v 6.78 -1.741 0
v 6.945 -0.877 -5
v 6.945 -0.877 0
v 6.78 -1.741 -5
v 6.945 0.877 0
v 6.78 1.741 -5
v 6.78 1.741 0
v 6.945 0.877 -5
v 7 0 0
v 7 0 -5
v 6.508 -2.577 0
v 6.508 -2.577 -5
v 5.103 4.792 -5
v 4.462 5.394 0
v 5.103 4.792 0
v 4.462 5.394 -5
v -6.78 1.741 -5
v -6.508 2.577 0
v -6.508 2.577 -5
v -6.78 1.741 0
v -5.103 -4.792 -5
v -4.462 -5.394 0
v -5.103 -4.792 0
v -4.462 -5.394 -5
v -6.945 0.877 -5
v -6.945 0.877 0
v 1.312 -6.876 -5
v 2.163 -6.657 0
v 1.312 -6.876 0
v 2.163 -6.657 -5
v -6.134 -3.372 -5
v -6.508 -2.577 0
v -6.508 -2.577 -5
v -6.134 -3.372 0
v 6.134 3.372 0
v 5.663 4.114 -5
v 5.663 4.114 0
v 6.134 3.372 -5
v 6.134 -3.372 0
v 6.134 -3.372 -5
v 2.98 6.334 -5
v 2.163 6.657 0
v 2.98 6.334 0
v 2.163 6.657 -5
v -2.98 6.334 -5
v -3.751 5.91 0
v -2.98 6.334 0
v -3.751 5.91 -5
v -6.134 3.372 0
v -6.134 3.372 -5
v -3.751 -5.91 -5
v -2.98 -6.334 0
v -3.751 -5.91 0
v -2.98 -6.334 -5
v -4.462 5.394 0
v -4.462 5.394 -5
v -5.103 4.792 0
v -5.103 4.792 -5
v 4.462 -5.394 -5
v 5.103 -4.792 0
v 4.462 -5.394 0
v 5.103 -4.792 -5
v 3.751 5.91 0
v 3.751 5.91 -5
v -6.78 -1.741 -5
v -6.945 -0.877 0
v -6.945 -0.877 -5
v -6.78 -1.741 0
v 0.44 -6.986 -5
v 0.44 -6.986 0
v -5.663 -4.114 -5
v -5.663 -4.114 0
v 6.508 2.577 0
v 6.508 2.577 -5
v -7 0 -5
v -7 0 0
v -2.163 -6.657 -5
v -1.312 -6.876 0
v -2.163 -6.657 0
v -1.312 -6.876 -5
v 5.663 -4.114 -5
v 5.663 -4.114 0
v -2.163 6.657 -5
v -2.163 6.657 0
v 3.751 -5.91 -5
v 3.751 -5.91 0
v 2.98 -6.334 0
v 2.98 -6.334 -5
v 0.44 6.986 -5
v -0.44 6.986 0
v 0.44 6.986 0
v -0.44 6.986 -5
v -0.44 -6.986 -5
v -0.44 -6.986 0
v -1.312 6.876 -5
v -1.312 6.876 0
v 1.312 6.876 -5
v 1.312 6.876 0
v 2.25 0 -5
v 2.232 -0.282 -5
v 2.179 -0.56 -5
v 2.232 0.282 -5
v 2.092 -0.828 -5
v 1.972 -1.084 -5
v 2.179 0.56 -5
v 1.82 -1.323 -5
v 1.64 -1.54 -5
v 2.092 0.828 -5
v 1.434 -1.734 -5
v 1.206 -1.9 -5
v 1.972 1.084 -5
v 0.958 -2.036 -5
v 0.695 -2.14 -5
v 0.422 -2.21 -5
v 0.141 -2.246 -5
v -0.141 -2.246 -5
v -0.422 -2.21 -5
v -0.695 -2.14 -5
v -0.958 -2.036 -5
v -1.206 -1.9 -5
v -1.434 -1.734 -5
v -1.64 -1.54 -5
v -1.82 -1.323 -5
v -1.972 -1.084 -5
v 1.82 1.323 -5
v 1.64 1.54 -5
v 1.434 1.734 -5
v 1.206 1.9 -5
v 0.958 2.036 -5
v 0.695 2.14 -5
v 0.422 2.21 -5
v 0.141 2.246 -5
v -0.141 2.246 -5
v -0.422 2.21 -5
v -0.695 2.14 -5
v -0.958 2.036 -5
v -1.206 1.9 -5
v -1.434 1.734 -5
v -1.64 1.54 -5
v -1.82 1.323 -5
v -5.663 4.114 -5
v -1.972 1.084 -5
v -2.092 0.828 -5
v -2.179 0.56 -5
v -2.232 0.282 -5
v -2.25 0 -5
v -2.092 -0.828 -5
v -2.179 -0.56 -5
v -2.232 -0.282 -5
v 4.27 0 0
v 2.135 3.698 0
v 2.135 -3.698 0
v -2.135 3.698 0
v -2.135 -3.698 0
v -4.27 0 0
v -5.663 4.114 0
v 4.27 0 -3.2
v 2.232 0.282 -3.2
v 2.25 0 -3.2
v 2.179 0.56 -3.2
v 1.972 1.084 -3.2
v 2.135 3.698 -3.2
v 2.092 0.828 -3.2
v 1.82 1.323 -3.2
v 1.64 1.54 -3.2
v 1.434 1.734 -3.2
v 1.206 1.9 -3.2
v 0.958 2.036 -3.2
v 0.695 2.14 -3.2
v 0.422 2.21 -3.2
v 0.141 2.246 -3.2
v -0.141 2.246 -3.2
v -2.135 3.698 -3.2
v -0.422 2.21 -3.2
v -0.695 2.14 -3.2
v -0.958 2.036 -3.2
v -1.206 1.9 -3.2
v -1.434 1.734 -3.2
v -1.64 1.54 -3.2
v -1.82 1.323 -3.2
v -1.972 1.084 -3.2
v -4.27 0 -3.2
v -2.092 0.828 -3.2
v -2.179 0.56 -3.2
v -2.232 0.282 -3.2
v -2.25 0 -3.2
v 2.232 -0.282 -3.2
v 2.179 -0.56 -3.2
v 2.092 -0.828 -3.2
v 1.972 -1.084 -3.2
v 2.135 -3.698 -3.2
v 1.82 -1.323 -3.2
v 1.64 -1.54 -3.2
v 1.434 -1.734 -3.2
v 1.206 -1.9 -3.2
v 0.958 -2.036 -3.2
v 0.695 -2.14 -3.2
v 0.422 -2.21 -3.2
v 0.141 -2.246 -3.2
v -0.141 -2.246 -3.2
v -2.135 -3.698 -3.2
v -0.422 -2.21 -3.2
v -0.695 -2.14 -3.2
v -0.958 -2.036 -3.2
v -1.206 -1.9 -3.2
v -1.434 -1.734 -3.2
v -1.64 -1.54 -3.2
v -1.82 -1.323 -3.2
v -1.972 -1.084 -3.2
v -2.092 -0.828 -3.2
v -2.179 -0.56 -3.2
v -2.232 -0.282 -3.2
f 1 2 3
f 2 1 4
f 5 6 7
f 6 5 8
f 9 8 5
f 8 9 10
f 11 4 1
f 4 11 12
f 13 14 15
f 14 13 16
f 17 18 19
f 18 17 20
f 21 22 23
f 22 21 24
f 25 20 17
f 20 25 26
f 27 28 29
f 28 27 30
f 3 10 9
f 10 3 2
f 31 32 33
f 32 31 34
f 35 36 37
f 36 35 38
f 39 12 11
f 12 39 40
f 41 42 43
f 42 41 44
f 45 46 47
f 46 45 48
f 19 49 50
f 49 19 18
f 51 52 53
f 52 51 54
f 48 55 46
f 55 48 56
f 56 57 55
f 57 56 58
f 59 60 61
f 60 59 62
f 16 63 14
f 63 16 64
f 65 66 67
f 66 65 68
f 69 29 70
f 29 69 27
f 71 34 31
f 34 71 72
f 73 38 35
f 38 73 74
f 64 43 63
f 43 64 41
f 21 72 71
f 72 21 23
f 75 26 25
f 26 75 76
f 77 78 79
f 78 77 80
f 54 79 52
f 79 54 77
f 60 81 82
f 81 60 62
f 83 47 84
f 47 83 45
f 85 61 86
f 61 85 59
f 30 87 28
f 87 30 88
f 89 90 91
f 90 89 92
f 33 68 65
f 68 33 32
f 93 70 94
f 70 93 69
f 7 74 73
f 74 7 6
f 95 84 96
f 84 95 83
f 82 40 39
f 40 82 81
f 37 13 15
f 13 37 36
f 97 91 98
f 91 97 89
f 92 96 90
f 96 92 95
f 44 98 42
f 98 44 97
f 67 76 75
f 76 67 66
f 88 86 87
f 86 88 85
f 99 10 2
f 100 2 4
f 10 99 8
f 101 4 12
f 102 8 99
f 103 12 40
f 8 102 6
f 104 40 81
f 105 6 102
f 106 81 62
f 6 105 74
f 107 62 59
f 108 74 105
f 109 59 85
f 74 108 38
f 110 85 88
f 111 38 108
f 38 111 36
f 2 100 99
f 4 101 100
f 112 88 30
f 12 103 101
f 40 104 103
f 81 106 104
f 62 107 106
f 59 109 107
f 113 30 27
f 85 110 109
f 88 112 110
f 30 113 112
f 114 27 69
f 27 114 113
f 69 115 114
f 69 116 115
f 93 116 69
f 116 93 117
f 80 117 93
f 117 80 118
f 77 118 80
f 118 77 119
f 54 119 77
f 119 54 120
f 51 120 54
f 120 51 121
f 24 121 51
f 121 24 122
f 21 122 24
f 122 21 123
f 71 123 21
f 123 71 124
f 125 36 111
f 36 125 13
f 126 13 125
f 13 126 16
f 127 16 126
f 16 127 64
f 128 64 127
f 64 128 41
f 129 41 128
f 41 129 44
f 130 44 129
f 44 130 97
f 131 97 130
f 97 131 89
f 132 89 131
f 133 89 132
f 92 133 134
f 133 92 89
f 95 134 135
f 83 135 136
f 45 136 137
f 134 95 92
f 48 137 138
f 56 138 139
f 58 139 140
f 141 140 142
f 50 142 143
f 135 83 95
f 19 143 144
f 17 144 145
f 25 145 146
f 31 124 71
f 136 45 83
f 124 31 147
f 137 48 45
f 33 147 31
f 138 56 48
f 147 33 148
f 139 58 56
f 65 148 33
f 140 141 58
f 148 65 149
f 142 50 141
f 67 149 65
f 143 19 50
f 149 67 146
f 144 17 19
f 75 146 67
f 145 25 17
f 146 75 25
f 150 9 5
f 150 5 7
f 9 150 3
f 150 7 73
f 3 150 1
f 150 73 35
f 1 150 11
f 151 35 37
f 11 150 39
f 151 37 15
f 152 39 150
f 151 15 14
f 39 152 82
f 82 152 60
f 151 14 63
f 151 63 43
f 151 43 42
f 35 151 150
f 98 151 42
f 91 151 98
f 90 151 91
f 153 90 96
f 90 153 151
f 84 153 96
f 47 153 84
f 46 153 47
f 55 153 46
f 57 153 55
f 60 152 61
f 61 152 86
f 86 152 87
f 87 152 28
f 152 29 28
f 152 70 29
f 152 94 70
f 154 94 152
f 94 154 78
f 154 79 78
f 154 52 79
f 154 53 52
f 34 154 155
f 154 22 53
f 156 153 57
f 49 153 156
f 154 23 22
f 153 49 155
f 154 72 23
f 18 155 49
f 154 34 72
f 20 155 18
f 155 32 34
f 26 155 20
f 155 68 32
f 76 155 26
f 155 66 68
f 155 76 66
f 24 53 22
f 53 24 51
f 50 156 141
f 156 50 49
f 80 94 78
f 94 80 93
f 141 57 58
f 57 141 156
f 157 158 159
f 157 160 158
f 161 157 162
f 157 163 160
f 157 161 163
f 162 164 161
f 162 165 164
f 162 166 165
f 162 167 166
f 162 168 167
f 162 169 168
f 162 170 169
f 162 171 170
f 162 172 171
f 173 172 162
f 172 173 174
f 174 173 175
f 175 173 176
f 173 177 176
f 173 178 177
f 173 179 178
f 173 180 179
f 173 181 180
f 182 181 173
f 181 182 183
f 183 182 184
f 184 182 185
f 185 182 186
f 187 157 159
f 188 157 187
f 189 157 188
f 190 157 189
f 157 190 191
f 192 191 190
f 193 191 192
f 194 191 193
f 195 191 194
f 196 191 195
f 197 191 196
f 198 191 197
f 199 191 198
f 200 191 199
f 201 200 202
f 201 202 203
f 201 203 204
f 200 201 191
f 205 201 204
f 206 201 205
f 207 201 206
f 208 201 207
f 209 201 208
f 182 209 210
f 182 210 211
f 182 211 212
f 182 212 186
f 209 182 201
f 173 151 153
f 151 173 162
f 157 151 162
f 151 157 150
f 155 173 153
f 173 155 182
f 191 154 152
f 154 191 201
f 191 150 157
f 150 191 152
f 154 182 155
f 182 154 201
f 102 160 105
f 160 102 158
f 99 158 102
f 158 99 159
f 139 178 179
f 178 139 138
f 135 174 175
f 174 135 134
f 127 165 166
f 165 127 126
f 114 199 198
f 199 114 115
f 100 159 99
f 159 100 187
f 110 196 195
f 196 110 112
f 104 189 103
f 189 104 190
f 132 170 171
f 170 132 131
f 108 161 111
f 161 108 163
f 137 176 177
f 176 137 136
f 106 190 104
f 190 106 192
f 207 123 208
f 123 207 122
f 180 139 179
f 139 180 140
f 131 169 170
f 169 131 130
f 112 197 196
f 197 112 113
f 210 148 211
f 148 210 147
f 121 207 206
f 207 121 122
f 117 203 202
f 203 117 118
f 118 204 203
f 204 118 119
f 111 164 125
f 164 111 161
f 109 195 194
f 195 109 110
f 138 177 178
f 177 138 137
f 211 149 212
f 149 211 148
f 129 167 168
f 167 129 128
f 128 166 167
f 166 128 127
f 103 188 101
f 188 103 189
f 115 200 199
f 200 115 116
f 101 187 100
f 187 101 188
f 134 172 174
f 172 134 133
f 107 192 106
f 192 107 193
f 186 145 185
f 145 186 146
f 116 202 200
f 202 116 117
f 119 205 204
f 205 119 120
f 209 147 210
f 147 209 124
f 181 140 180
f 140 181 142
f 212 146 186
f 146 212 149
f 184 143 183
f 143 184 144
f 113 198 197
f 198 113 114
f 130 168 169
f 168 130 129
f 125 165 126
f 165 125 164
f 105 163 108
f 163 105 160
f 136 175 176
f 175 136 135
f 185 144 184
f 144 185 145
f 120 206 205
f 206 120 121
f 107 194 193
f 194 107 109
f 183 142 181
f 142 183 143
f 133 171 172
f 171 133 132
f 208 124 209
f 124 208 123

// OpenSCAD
$fn = 50;


difference() {
	union() {
		translate(v = [0, 0, -5.0000000000]) {
			cylinder(h = 5.0000000000, r = 7.0000000000);
		}
		translate(v = [0, 0, -3.5000000000]) {
			cylinder(h = 3.5000000000, r = 2.8750000000);
		}
	}
	union() {
		translate(v = [0, 0, 0]) {
			rotate(a = [0, 0, 0]) {
				difference() {
					union() {
						translate(v = [0, 0, -3.2000000000]) {
							linear_extrude(height = 3.2000000000) {
								polygon(points = [[4.2698000000, 0.0000000000], [2.1349000000, 3.6977552691], [-2.1349000000, 3.6977552691], [-4.2698000000, 0.0000000000], [-2.1349000000, -3.6977552691], [2.1349000000, -3.6977552691]]);
							}
						}
					}
					union();
				}
			}
		}
		#translate(v = [0, 0, -100.0000000000]) {
			cylinder(h = 200, r = 2.2500000000);
		}
	}
}
